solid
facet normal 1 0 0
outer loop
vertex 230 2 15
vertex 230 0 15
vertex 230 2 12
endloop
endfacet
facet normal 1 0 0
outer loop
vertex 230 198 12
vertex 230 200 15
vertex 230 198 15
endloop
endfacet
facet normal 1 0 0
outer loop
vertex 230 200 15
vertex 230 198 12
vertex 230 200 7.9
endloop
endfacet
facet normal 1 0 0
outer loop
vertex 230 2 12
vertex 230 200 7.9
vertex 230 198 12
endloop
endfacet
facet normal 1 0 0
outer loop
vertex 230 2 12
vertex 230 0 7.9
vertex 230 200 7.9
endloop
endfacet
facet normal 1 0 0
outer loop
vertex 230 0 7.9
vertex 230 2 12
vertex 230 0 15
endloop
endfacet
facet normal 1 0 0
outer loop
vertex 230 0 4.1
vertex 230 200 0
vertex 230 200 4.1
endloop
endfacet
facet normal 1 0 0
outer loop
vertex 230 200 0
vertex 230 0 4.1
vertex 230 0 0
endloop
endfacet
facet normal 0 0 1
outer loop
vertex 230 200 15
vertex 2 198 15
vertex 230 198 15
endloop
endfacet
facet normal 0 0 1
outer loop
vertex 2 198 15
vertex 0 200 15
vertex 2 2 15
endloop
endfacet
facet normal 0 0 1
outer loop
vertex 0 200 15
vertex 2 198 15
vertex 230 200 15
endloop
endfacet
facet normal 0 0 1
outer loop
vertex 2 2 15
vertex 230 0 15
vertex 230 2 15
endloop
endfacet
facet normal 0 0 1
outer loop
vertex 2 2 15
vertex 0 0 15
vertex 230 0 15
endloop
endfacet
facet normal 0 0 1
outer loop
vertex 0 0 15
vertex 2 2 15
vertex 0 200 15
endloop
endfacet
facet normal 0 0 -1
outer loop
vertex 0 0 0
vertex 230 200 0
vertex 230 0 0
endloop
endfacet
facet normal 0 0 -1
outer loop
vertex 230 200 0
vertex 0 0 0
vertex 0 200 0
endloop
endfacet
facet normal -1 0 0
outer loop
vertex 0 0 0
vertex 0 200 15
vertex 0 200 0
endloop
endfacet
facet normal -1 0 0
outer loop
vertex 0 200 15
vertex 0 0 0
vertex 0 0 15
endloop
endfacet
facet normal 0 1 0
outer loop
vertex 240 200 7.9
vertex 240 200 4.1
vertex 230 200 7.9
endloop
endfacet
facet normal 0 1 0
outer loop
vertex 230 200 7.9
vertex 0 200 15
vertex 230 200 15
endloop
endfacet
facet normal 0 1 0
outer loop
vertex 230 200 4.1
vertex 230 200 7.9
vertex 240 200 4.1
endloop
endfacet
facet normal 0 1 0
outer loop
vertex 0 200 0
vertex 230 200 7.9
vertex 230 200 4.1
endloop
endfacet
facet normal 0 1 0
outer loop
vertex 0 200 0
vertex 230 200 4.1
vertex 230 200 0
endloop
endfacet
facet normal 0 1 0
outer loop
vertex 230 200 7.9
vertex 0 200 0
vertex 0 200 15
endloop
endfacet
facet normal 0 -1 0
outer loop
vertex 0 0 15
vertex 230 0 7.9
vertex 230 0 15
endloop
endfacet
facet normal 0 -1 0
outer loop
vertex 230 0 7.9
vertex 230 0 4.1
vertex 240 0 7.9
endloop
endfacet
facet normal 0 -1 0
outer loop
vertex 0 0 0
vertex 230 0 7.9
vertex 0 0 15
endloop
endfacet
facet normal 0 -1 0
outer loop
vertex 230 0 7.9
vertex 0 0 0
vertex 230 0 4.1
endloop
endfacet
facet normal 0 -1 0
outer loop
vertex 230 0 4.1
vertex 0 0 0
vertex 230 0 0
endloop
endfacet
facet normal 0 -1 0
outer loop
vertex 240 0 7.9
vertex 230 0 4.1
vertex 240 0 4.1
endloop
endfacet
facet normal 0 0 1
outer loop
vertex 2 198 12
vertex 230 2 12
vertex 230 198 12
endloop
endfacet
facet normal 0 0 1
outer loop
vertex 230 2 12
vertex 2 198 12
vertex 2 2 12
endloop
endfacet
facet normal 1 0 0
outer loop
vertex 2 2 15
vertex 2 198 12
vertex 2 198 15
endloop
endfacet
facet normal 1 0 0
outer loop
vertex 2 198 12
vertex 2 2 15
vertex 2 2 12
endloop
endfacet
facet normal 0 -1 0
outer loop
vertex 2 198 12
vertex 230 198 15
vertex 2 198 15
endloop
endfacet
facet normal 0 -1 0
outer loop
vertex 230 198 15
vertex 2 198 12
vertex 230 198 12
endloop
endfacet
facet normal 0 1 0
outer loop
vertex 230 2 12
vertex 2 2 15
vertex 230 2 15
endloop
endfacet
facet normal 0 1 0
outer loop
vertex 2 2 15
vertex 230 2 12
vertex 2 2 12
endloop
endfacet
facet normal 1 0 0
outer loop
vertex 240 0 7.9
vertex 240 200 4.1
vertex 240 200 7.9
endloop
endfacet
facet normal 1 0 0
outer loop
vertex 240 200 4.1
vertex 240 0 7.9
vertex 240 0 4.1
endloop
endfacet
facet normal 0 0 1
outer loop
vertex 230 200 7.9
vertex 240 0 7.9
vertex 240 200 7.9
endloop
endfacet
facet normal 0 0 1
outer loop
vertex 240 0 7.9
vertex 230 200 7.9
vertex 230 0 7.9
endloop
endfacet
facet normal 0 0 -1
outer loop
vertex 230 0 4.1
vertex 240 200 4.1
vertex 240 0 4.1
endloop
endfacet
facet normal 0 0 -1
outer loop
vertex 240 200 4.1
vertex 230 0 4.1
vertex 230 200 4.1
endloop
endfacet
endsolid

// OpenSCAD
difference()
{
  cube([230,200,15]);
  translate([2,2,12]) cube([240,196,5]);
}
translate([230,0,4.1]) cube([10,200,3.8]);
